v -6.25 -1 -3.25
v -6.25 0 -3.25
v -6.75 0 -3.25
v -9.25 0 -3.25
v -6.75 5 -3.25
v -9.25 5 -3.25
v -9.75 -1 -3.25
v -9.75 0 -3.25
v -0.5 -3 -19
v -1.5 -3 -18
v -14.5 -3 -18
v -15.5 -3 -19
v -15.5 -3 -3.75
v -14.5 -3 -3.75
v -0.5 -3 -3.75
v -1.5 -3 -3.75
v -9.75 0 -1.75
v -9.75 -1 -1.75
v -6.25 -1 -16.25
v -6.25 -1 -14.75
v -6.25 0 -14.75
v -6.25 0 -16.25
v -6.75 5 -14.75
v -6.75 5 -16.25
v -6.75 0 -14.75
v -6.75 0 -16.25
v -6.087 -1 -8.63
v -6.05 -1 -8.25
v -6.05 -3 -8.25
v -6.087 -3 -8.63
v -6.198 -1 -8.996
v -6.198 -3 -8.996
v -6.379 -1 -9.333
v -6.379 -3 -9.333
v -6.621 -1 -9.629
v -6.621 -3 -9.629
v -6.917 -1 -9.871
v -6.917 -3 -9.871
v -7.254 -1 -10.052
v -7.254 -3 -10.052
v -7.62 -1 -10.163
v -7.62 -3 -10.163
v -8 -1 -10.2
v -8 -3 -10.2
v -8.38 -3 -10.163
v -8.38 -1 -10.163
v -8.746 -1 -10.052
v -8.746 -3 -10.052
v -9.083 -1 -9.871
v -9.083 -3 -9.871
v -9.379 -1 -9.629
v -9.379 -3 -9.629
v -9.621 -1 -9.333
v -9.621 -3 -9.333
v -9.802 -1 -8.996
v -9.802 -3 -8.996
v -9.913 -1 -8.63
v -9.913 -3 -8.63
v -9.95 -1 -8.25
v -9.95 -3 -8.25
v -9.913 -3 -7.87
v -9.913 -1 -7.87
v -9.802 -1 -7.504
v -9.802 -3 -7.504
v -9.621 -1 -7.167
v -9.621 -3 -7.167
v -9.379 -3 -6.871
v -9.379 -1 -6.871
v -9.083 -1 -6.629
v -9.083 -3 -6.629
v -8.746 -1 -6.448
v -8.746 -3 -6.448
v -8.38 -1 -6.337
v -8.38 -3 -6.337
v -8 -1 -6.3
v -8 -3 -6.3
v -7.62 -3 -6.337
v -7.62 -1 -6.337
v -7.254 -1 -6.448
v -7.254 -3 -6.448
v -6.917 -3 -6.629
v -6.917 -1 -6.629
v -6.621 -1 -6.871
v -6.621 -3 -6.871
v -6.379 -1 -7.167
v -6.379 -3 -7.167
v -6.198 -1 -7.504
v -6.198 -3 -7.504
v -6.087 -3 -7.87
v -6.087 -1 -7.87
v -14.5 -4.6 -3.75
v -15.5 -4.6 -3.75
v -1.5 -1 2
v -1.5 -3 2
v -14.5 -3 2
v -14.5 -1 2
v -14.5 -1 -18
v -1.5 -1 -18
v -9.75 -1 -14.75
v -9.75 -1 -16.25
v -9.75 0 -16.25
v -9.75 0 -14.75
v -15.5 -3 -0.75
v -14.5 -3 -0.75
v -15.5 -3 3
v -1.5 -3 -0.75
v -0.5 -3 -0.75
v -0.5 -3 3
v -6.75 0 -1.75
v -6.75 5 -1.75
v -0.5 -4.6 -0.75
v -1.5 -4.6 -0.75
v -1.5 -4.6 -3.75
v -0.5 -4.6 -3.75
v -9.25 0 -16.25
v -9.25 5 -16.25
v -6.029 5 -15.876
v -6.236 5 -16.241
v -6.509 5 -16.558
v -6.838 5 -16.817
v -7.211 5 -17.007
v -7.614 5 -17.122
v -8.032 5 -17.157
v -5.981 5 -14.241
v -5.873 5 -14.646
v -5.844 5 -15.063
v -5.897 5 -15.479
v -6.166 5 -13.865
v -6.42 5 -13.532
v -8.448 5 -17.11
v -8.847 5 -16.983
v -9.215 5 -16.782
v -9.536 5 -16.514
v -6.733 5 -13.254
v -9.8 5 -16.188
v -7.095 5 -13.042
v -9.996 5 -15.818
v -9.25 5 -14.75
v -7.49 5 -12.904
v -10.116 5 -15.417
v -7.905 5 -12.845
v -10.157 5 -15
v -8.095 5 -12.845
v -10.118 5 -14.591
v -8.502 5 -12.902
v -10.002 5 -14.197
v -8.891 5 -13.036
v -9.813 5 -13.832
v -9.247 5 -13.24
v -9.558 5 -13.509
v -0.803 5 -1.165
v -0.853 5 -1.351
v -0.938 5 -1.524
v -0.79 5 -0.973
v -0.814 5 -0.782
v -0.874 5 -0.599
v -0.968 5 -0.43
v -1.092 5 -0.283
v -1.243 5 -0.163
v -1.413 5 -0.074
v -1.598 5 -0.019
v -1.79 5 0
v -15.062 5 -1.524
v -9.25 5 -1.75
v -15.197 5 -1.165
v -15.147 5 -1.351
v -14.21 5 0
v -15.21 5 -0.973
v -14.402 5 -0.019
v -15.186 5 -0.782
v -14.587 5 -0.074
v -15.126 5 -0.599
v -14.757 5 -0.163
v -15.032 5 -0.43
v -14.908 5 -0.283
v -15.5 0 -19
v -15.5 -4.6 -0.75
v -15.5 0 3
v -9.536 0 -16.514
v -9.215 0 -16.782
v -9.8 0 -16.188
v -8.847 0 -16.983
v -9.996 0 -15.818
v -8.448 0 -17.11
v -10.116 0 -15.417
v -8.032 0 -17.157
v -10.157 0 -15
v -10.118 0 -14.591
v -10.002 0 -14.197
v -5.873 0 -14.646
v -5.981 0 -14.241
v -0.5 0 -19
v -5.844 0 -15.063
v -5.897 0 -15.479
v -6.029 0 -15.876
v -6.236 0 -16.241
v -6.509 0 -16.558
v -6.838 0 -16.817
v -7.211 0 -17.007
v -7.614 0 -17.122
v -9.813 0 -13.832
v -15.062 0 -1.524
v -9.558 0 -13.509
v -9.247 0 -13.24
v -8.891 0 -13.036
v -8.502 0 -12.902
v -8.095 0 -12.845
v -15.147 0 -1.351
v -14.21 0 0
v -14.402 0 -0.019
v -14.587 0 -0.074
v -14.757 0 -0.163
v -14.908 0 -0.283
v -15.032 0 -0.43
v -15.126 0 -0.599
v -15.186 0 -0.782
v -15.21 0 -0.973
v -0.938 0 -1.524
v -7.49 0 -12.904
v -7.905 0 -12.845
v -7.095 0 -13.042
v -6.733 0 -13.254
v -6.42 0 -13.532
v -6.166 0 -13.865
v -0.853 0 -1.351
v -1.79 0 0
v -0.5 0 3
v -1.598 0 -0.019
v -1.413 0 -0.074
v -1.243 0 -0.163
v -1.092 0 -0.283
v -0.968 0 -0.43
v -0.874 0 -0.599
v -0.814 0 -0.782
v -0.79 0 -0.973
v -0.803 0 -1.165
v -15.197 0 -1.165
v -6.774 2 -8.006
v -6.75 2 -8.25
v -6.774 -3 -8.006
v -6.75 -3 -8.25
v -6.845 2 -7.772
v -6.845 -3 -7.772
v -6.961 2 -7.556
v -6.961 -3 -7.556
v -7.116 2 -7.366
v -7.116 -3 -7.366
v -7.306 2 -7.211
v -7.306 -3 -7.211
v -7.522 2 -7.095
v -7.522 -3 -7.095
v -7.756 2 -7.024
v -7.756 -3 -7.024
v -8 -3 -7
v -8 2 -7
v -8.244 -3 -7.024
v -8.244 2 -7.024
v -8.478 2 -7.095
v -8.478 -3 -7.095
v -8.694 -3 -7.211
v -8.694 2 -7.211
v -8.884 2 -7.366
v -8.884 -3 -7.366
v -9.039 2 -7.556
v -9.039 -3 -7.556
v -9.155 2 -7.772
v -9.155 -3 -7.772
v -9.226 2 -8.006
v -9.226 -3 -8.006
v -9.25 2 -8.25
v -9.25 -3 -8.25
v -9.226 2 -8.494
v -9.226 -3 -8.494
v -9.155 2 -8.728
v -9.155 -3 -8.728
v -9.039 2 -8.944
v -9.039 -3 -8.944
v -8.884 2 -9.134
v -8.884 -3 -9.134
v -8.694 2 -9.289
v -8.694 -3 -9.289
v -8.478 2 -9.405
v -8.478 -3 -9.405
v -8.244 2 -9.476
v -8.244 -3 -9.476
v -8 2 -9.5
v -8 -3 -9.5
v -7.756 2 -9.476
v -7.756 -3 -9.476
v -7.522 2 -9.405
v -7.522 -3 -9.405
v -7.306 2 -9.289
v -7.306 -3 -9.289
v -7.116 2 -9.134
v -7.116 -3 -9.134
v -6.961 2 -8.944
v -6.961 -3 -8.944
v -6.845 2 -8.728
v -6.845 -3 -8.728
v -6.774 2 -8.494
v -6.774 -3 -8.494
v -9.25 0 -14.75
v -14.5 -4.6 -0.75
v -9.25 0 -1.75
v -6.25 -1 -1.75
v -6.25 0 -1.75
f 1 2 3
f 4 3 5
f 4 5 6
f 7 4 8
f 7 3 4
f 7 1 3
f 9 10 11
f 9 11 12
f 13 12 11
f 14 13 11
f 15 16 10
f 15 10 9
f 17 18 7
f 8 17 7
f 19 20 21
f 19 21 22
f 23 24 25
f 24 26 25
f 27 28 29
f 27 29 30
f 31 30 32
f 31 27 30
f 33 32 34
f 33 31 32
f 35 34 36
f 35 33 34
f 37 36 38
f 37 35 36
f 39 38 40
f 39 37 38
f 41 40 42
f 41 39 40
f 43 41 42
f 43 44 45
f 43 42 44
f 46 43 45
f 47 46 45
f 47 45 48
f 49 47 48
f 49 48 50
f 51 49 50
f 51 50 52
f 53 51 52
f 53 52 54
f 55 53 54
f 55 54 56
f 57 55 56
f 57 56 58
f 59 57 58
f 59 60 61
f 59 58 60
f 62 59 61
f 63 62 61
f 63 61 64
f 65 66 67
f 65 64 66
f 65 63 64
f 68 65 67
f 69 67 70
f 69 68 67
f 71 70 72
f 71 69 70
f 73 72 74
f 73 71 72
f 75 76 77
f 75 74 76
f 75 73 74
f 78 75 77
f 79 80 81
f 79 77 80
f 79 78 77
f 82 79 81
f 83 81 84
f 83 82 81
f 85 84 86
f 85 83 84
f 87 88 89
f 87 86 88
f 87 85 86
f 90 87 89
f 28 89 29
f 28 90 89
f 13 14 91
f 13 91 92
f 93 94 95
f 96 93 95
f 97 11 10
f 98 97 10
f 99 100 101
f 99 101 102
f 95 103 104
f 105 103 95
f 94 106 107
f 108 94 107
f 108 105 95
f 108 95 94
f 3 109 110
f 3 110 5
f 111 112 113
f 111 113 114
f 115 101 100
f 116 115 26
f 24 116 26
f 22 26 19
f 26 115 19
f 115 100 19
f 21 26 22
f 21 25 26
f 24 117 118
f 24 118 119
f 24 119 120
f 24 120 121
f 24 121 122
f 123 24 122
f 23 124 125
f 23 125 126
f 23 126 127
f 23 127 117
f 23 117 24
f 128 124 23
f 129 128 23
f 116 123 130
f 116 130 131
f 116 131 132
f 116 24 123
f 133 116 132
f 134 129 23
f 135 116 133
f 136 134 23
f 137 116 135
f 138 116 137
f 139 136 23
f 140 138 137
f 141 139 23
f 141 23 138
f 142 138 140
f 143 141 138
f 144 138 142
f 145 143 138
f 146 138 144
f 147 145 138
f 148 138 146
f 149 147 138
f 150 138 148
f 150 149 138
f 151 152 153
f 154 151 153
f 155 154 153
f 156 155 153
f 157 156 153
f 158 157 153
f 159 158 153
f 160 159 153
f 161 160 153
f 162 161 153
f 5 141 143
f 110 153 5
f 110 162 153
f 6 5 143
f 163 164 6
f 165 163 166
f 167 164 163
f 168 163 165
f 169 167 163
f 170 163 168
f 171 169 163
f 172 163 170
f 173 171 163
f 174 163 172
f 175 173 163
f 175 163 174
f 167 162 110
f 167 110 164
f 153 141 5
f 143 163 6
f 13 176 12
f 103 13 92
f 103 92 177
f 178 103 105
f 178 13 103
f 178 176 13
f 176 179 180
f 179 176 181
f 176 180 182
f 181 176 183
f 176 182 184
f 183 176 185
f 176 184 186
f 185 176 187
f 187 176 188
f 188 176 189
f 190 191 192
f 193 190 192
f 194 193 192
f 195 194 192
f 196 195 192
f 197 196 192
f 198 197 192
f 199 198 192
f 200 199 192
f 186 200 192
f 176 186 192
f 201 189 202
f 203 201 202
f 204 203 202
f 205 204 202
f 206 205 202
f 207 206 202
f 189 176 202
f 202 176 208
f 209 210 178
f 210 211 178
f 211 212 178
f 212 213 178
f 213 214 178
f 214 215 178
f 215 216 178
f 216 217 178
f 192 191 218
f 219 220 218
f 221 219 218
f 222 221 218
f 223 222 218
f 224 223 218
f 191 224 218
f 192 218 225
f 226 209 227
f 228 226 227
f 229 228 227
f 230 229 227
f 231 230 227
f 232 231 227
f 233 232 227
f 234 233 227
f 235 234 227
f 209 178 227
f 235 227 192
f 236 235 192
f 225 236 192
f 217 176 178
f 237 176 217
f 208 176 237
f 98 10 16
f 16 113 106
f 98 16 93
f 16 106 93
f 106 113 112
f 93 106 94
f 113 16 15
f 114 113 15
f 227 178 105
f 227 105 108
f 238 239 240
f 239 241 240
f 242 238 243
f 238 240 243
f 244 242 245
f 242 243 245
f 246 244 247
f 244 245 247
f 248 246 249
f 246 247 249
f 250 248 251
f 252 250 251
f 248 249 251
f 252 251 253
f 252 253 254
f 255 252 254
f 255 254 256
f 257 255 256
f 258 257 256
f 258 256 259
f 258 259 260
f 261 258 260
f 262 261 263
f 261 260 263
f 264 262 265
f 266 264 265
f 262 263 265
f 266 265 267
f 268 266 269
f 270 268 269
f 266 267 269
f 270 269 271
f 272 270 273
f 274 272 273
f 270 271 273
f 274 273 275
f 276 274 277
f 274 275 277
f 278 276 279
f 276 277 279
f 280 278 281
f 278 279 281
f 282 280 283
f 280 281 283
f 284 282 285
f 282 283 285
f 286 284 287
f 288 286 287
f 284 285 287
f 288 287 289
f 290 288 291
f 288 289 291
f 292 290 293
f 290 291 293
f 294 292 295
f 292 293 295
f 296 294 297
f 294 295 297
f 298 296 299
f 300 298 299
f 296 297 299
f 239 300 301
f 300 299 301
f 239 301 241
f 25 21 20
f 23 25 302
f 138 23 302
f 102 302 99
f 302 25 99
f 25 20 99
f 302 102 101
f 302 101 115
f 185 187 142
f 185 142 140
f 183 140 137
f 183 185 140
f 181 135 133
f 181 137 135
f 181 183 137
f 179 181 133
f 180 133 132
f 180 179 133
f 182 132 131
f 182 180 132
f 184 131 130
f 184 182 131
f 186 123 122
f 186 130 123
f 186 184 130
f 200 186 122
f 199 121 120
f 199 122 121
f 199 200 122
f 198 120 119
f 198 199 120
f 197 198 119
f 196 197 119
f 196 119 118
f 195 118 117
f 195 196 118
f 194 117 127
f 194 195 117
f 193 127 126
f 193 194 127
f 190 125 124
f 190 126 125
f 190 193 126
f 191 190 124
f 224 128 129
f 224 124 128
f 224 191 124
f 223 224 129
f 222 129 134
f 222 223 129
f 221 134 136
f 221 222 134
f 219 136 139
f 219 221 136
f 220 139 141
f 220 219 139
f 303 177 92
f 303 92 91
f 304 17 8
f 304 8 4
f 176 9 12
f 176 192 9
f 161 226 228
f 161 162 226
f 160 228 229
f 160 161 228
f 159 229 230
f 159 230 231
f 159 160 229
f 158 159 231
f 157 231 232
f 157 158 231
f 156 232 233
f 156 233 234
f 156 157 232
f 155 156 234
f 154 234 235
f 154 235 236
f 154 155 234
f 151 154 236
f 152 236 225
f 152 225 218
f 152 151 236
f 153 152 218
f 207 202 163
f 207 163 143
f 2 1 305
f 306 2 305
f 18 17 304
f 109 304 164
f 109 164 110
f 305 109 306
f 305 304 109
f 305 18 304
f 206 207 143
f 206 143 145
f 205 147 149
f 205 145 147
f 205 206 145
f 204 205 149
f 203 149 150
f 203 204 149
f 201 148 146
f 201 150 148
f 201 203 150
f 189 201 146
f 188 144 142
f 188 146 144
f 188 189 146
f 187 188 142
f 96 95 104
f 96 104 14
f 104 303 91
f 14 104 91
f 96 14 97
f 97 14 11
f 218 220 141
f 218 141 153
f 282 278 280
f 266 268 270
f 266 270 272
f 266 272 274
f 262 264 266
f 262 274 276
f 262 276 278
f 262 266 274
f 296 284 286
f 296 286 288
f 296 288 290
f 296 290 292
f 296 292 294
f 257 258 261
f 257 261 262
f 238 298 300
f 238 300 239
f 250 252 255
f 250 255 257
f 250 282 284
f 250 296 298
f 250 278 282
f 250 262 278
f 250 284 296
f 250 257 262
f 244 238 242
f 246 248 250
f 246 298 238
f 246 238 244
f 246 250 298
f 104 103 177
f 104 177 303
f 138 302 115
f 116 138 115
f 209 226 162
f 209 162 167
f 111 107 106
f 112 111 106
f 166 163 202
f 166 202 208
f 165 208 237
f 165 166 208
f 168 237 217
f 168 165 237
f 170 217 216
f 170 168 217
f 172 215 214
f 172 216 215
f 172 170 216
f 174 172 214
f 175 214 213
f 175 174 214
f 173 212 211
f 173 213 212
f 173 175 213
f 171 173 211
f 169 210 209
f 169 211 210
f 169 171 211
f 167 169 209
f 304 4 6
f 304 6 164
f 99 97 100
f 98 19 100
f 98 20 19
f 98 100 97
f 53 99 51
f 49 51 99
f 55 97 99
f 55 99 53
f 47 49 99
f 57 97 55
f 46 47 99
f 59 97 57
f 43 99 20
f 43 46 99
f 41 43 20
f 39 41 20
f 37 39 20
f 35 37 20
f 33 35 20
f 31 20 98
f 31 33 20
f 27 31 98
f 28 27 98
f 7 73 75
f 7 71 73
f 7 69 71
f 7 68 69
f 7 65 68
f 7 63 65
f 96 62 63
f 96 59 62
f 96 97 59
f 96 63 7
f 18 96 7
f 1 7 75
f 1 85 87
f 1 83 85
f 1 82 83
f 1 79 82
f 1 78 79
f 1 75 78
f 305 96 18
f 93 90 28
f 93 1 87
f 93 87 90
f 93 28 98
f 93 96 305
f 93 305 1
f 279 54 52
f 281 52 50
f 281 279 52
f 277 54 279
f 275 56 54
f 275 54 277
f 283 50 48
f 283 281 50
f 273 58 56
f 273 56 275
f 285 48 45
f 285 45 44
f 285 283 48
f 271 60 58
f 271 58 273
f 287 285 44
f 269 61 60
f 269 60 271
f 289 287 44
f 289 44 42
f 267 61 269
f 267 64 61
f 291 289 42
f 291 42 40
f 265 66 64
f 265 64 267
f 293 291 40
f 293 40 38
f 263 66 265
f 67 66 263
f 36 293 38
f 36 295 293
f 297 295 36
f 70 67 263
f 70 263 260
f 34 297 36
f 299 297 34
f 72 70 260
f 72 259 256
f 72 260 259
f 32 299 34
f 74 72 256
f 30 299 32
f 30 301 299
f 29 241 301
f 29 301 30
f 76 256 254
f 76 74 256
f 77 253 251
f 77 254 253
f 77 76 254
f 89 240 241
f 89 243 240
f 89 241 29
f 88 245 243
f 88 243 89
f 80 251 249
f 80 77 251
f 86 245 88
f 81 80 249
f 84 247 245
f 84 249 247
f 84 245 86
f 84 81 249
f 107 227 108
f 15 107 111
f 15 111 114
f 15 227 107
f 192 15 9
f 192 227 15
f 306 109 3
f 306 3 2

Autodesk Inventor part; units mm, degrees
ref_plane "YZ Plane" through (0, 0, 0) normal (1, 0, 0) x (0, 1, 0)
ref_plane "XZ Plane" through (0, 0, 0) normal (0, 1, 0) x (-1, 0, 0)
ref_plane "XY Plane" through (0, 0, 0) normal (0, 0, 1) x (1, 0, 0)
sketch "Sketch5" plane through (0, 0, 0) normal (0, 1, 0) x (-1, 0, 0)
  line L0 (-3.1299, 16.302) -> (-3.1299, -27.8812) construction
  line L1 (-3.1299, -27.8812) -> (-19.0358, -27.8812) construction
  line L2 (-19.0358, -27.8812) -> (-19.0358, 16.302) construction
  line L3 (-19.0358, 16.302) -> (-3.1299, 16.302) construction
  line L4 (0, 0) -> (16, 0)
  line L5 (8, 0) -> (8, -24.9508) construction
  line L6 (16, 0) -> (8, -13)
  line L7 (8, -13) -> (0, 0)
  circle A0 centre (8, -15) radius 2.1568
  line L8 (0, 0) -> (0, -12.5098) construction
  point P0 (7.9048, -12.8453)
  point P1 (8.0952, -12.8453)
  dimension "d36" = 16
  dimension "d42" = 13
  dimension "d43" = 2
extrude "Extrusion4" add sketch "Sketch5" along normal blind 5
sketch "Sketch6" plane through (0, 5, 0) normal (0, 1, 0) x (1, 0, 0)
  arc A0 (-7.9048, 12.8453) -> (-8.0952, 12.8453) centre (-8, 15) ccw projected
  circle A1 centre (-8, 15) radius 1.6568
  line L0 (-16, 0) -> (0, 0) projected
  line L1 (-16, 0) -> (0, 0) construction
  line L2 (-14.2104, 1) -> (-8, 11.092)
  line L3 (-8.0952, 12.8453) -> (-16, 0) projected
  line L4 (-8, 11.092) -> (-1.7896, 1)
  line L5 (0, 0) -> (-7.9048, 12.8453) projected
  line L6 (-14.2104, 1) -> (-1.7896, 1)
  line L7 (-8, 15) -> (-8, 0) construction
  dimension "d46" = 0.5
  dimension "d52" = 1
  dimension "d53" = 1
extrude "Extrusion5" [suppressed]
fillet "Fillet1" radius 1 2 edges at (0, 2.5, 0) (-16, 2.5, 0)
sketch "Sketch9" plane through (0, 0, 0) normal (0, -1, 0) x (1, 0, 0)
  line L0 (-15.5, 3) -> (-0.5, 3)
  line L1 (-0.5, 3) -> (-0.5, -19)
  line L2 (-0.5, -19) -> (-15.5, -19)
  line L3 (-15.5, -19) -> (-15.5, 3)
  line L4 (-15.5, 3) -> (-0.5, -19) construction
  line L5 (-0.5, 3) -> (-15.5, -19) construction
  line L6 (-14.2104, 0) -> (-1.7896, 0) projected
  line L7 (-8, -15) -> (-8, 0) construction
  arc A0 (-8.0952, -12.8453) -> (-7.9048, -12.8453) centre (-8, -15) ccw construction
  circle A1 centre (-8, -15) radius 2.1568 construction
  point P0 (0, 0)
  point P1 (-8, -8)
  dimension "d75" = 15
  dimension "d76" = 22
  dimension "d77" = 3
extrude "Extrusion7" add sketch "Sketch9" along normal blind 3
sketch "Sketch10" plane through (0, -3, 0) normal (0, -1, 0) x (1, 0, 0)
  line L0 (-0.5, -19) -> (-0.5, 3) projected
  line L1 (-0.5, -0.75) -> (-1.5, -0.75)
  line L2 (-1.5, -0.75) -> (-1.5, -3.75)
  line L3 (-1.5, -3.75) -> (-0.5, -3.75)
  line L4 (-0.5, -3.75) -> (-0.5, -0.75)
  line L5 (-15.5, 3) -> (-15.5, -19) projected
  line L6 (-15.5, -0.75) -> (-14.5, -0.75)
  line L7 (-14.5, -0.75) -> (-14.5, -3.75)
  line L8 (-14.5, -3.75) -> (-15.5, -3.75)
  line L9 (-15.5, -3.75) -> (-15.5, -0.75)
  line L10 (-0.5, 3) -> (-15.5, 3) projected
  point P0 (0, 0)
  point P1 (-15.5, -3.75)
  point P2 (-0.5, -3.75)
  dimension "d80" = 1
  dimension "d81" = 3
  dimension "d82" = 1
  dimension "d83" = 3
  dimension "d84" = 3.75
  dimension "d85" = 3.75
extrude "Extrusion8" add sketch "Sketch10" along normal blind 1.6
sketch "Sketch11" plane through (0, -3, 0) normal (0, -1, 0) x (1, 0, 0)
  line L0 (-9.25, -1.75) -> (-6.75, -1.75)
  line L1 (-6.75, -1.75) -> (-6.75, -3.25)
  line L2 (-6.75, -3.25) -> (-9.25, -3.25)
  line L3 (-9.25, -3.25) -> (-9.25, -1.75)
  line L4 (-8, 0) -> (-8, -15.1696) construction
  line L5 (-15.5, -19) -> (-0.5, -19) construction
  line L6 (-8, -19) -> (-8, 3) construction
  line L7 (-0.5, 3) -> (-15.5, 3) construction
  line L8 (-1.5, -0.75) -> (-1.5, -3.75) projected
  line L9 (-14.5, -3.75) -> (-14.5, -0.75) projected
  line L10 (-0.5, -0.75) -> (-1.5, -0.75) projected
  line L11 (-15.5, -3.75) -> (-15.5, -19) projected
  line L12 (-6.75, -14.75) -> (-9.25, -14.75)
  line L13 (-9.25, -14.75) -> (-9.25, -16.25)
  line L14 (-9.25, -16.25) -> (-6.75, -16.25)
  line L15 (-6.75, -16.25) -> (-6.75, -14.75)
  line L16 (-6.75, -14.75) -> (-9.25, -16.25) construction
  line L17 (-9.25, -14.75) -> (-6.75, -16.25) construction
  line L18 (-1.5, -3.75) -> (-0.5, -3.75) projected
  point P0 (0, 0)
  point P1 (-8, -1.75)
  point P2 (-9.25, -2.5)
  point P3 (-8, -3.25)
  point P4 (-8, 0)
  point P5 (-8, -8)
  point P6 (-6.75, -2.5)
  point P7 (-8, -15.5)
  point P8 (-6.75, -15.5)
  dimension "d129" = 7.5
  dimension "d133" = 1.5
  dimension "d136" = 2.5
  dimension "d137" = 1.5
  dimension "d138" = 13
  dimension "d141" = 0.5
extrude "Extrusion9" cut sketch "Sketch11" against normal blind 16
sketch "Sketch13" plane through (0, -3, 0) normal (0, -1, 0) x (1, 0, 0)
  line L0 (-1.5, 2) -> (-14.5, 2)
  line L1 (-14.5, 2) -> (-14.5, -18)
  line L2 (-14.5, -18) -> (-1.5, -18)
  line L3 (-1.5, -18) -> (-1.5, 2)
  line L4 (-0.5, 3) -> (-15.5, 3) projected
  line L5 (-0.5, -0.75) -> (-0.5, 3) projected
  line L6 (-15.5, 3) -> (-15.5, -0.75) projected
  line L7 (-15.5, -19) -> (-0.5, -19) projected
  point P0 (0, 0)
  point P1 (-15.5, 1.125)
  dimension "d106" = 1
  dimension "d107" = 1
  dimension "d108" = 1
  dimension "d109" = 1
extrude "Extrusion11" cut sketch "Sketch13" against normal blind 2
sketch "Sketch14" plane through (0, -1, 0) normal (0, -1, 0) x (1, 0, 0)
  line L0 (-9.25, -14.75) -> (-9.25, -16.25) construction
  line L1 (-9.25, -15.5) -> (-6.75, -15.5) construction
  line L2 (-6.75, -16.25) -> (-6.75, -14.75) construction
  line L3 (-9.25, -16.25) -> (-6.75, -16.25) construction
  line L4 (-8, -16.25) -> (-8, -1.75) construction
  line L5 (-6.75, -1.75) -> (-9.25, -1.75) construction
  line L6 (-9.25, -1.75) -> (-9.25, -3.25) construction
  line L7 (-9.25, -2.5) -> (-6.75, -2.5) construction
  line L8 (-6.25, -16.25) -> (-9.75, -16.25)
  line L9 (-9.75, -16.25) -> (-9.75, -14.75)
  line L10 (-9.75, -14.75) -> (-6.25, -14.75)
  line L11 (-6.25, -14.75) -> (-6.25, -16.25)
  line L12 (-6.25, -16.25) -> (-9.75, -14.75) construction
  line L13 (-9.75, -16.25) -> (-6.25, -14.75) construction
  line L14 (-6.25, -1.75) -> (-9.75, -1.75)
  line L15 (-9.75, -1.75) -> (-9.75, -3.25)
  line L16 (-9.75, -3.25) -> (-6.25, -3.25)
  line L17 (-6.25, -3.25) -> (-6.25, -1.75)
  line L18 (-6.25, -1.75) -> (-9.75, -3.25) construction
  line L19 (-9.75, -1.75) -> (-6.25, -3.25) construction
  point P0 (0, 0)
  point P1 (-8, -15.5)
  point P2 (-8, -2.5)
  dimension "d139" = 3.5
  dimension "d140" = 1.5
extrude "Extrusion12" cut sketch "Sketch14" against normal blind 1
sketch "Sketch15" plane through (0, -1, 0) normal (0, -1, 0) x (1, 0, 0)
  circle A0 centre (-8, -8.25) radius 1.25
  line L0 (-8, 0) -> (-8, -15) construction
  circle A1 centre (-8, -8.25) radius 1.95
  line L1 (-14.5, 2) -> (-1.5, 2) projected
  line L2 (-9.25, -3.25) -> (-6.75, -3.25) projected
  point P0 (0, 0)
  point P1 (-10.0959, -3.25)
  point P2 (-13.4041, -3.25)
  point P3 (-6.25, -3.25)
  point P4 (-9.75, -3.25)
  dimension "d117" = 2.5
  dimension "d118" = 0.7
  dimension "d131" = 10.25
extrude "Extrusion13" add sketch "Sketch15" along normal blind 2 contours A0 | A1
sketch "Sketch17" plane through (0, -1, 0) normal (0, -1, 0) x (1, 0, 0)
  point P0 (0, 0)
sketch "Sketch16" plane through (-8, -3, -8.25) normal (0, -1, 0) x (1, 0, 0)
  circle A0 centre (0, 0) radius 1.95 projected
  circle A1 centre (0, 0) radius 1.25
  point P0 (8, 8.25)
  point P1 (-1.9339, 0.25)
  point P2 (1.9339, 0.25)
  dimension "d123" = 2.5
  dimension "d60" = 2.5
  dimension "d61" = 0.7
  dimension "d62" = 2.5
  dimension "d63" = 1.5
  dimension "d68" = 13
  dimension "d69" = 3.75
  dimension "d70" = 3.75
  dimension "d72" = 3.75
  dimension "d0" = 15
  dimension "d2" = 10
  dimension "d11" = 5
  dimension "d12" = 1.8
extrude "Extrusion14" cut sketch "Sketch16" against normal blind 5 contours A1
properties part number "NOTGATE2"
